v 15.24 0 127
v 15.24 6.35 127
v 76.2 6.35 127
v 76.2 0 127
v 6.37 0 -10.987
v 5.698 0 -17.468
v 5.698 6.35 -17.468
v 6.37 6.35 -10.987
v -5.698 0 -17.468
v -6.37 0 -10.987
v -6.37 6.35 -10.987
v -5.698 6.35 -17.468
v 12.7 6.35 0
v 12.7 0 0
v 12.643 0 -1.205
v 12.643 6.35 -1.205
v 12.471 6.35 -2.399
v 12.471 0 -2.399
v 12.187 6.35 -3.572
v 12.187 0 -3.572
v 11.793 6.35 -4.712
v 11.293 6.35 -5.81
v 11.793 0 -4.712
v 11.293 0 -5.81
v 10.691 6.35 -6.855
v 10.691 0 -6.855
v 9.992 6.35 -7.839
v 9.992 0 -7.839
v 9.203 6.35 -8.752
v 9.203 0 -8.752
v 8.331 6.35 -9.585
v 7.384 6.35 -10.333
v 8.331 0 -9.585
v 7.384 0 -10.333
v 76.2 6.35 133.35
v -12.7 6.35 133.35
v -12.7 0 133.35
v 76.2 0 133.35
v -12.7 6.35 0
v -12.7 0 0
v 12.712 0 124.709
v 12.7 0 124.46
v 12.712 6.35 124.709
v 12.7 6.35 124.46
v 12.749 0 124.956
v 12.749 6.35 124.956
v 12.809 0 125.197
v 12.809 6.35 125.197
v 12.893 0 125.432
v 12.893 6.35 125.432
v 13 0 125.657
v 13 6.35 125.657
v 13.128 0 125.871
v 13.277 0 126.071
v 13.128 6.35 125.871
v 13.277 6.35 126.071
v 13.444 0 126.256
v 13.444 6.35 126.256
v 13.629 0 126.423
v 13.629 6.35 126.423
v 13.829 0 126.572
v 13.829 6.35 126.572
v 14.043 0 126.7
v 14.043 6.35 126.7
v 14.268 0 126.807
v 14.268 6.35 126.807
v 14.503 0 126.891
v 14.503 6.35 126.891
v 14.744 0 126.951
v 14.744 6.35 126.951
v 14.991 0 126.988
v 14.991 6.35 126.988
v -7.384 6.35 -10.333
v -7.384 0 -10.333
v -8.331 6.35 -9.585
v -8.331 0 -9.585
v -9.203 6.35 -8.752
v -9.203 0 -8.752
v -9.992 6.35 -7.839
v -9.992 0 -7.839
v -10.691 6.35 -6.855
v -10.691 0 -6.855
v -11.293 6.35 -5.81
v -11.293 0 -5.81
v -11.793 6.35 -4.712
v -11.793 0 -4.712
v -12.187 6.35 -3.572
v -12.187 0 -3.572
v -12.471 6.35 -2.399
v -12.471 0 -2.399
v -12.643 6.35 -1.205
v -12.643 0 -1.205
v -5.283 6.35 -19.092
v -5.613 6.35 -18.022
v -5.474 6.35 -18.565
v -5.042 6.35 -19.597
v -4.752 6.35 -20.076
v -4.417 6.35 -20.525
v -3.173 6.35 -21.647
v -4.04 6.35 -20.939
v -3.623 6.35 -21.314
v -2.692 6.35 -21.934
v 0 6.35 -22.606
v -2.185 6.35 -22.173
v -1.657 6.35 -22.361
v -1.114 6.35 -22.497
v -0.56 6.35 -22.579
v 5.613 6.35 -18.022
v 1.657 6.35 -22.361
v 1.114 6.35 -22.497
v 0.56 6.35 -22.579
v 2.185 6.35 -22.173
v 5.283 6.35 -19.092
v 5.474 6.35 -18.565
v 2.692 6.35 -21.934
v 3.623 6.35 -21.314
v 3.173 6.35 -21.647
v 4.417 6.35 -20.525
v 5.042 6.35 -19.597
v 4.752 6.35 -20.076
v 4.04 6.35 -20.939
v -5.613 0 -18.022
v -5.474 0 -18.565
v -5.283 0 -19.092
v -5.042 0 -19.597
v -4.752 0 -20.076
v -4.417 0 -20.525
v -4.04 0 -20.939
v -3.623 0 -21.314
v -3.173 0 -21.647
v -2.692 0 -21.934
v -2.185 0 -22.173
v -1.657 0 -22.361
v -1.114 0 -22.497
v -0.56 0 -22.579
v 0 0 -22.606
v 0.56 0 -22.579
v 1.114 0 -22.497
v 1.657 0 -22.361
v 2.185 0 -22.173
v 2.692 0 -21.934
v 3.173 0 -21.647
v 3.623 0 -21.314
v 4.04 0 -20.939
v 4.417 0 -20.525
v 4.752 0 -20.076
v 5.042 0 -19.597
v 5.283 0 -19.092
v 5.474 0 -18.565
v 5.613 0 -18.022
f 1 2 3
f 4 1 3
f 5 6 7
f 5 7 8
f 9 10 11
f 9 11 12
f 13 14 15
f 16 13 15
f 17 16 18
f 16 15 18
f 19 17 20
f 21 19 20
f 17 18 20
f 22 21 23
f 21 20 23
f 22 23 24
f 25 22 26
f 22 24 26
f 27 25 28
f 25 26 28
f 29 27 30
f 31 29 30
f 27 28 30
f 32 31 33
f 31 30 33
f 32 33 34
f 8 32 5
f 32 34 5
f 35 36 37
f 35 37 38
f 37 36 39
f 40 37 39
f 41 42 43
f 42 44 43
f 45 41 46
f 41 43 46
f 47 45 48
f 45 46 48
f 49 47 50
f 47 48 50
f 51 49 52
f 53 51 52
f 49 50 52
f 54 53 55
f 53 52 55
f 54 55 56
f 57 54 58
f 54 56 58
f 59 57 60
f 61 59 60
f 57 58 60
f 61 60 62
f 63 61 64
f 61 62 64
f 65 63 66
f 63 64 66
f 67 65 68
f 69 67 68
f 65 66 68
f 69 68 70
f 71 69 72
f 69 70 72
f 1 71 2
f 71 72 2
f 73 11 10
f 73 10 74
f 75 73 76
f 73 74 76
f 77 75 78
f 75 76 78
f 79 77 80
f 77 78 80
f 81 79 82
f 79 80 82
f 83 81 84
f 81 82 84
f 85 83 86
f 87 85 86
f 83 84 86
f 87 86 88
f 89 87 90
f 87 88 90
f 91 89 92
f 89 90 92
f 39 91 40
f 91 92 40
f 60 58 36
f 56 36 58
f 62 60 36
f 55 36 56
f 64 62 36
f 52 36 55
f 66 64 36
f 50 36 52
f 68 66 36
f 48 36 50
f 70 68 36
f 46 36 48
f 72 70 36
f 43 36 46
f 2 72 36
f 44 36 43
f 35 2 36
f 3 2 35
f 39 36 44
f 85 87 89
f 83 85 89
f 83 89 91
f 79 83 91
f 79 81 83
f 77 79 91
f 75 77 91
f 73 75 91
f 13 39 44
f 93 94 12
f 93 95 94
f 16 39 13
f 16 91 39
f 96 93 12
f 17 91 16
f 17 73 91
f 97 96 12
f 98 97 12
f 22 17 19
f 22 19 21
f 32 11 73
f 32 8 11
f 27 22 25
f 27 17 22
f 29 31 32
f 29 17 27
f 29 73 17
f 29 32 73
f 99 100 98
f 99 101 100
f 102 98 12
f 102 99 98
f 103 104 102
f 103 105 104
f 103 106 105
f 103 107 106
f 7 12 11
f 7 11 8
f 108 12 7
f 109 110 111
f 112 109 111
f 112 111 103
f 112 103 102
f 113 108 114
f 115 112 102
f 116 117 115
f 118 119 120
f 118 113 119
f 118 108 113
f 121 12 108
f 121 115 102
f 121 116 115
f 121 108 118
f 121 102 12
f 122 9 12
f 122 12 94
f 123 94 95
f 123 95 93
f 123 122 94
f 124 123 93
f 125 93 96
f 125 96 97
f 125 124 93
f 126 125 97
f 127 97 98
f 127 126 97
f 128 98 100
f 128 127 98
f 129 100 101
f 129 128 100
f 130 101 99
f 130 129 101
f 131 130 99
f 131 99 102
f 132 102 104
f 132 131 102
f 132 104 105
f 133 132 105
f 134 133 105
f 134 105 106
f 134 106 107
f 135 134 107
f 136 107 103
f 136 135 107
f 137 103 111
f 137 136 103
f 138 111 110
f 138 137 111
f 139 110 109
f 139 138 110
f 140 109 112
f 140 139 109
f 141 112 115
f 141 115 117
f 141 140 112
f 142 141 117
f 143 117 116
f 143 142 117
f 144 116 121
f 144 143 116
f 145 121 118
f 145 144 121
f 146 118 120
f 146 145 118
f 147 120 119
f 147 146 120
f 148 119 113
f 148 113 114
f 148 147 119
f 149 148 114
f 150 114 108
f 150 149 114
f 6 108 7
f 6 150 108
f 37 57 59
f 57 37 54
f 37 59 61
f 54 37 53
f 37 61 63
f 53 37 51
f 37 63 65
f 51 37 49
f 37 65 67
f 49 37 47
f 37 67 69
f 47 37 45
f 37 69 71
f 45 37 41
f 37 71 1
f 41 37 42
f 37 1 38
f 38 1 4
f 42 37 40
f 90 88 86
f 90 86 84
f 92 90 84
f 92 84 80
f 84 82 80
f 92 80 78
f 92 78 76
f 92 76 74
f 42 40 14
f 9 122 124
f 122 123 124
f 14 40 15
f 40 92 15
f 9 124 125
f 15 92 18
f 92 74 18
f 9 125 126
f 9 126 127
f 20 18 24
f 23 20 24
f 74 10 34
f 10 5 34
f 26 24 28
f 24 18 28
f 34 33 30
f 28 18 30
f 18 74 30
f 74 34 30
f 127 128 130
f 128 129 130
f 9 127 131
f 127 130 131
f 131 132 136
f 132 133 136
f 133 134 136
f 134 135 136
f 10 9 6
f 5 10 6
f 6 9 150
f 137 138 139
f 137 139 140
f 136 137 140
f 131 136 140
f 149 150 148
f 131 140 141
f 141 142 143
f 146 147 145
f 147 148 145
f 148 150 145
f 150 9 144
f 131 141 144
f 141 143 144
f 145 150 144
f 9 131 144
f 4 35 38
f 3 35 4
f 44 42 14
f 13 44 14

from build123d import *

# Parameters (mm, degrees)
BOSS_EXTRUDE1_DEPTH = 6.35
SKETCH2_W           = 88.9
SKETCH2_H           = 6.35
BOSS_EXTRUDE2_DEPTH = 6.35
FILLET1_R           = 2.54
BOSS_EXTRUDE3_DEPTH = 6.35


with BuildPart() as part:
    # Sketch1 → Boss-Extrude1 (new body)
    with BuildSketch(Plane(origin=(0, 0, 0), x_dir=(1, 0, 0), z_dir=(0, 1, 0))):
        with BuildLine():
            ThreePointArc((12.7, 0), (0, -12.7), (-12.7, 0))
            Line((-12.7, 0), (-12.7, -127))
            Line((-12.7, -127), (12.7, -127))
            Line((12.7, -127), (12.7, 0))
        make_face()
        with BuildLine():
            ThreePointArc((12.7, 0), (0, 12.7), (-12.7, 0))
            Line((-12.7, 0), (12.7, 0))
        make_face()
        with BuildLine():
            Line((12.7, 0), (-12.7, 0))
            ThreePointArc((-12.7, 0), (0, -12.7), (12.7, 0))
        make_face()
    extrude(amount=BOSS_EXTRUDE1_DEPTH)

    # Sketch2 → Boss-Extrude2 (add)
    with BuildSketch(Plane(origin=(0, 6.35, 0), x_dir=(1, 0, 0), z_dir=(0, 1, 0))):
        with Locations((31.75, -130.175)):
            Rectangle(SKETCH2_W, SKETCH2_H)
    extrude(amount=-BOSS_EXTRUDE2_DEPTH)

    # Fillet1
    fillet1_edges = [part.edges().sort_by_distance(p)[0] for p in [
        (12.7, 3.175, 127),
    ]]
    fillet(fillet1_edges, radius=FILLET1_R)

    # Sketch3 → Boss-Extrude3 (add)
    with BuildSketch(Plane(origin=(0, 0, 0), x_dir=(-1, 0, 0), z_dir=(0, -1, 0))):
        with BuildLine():
            Line((-7.384124229, 1.213847931), (7.384124229, 1.213847931))
            Line((7.384124229, 1.213847931), (5.698055631, 17.468424552))
            ThreePointArc((5.698055631, 17.468424552), (0, 22.606), (-5.698055631, 17.468424552))
            Line((-5.698055631, 17.468424552), (-7.384124229, 1.213847931))
        make_face()
    extrude(amount=-BOSS_EXTRUDE3_DEPTH)


solid = part.part
